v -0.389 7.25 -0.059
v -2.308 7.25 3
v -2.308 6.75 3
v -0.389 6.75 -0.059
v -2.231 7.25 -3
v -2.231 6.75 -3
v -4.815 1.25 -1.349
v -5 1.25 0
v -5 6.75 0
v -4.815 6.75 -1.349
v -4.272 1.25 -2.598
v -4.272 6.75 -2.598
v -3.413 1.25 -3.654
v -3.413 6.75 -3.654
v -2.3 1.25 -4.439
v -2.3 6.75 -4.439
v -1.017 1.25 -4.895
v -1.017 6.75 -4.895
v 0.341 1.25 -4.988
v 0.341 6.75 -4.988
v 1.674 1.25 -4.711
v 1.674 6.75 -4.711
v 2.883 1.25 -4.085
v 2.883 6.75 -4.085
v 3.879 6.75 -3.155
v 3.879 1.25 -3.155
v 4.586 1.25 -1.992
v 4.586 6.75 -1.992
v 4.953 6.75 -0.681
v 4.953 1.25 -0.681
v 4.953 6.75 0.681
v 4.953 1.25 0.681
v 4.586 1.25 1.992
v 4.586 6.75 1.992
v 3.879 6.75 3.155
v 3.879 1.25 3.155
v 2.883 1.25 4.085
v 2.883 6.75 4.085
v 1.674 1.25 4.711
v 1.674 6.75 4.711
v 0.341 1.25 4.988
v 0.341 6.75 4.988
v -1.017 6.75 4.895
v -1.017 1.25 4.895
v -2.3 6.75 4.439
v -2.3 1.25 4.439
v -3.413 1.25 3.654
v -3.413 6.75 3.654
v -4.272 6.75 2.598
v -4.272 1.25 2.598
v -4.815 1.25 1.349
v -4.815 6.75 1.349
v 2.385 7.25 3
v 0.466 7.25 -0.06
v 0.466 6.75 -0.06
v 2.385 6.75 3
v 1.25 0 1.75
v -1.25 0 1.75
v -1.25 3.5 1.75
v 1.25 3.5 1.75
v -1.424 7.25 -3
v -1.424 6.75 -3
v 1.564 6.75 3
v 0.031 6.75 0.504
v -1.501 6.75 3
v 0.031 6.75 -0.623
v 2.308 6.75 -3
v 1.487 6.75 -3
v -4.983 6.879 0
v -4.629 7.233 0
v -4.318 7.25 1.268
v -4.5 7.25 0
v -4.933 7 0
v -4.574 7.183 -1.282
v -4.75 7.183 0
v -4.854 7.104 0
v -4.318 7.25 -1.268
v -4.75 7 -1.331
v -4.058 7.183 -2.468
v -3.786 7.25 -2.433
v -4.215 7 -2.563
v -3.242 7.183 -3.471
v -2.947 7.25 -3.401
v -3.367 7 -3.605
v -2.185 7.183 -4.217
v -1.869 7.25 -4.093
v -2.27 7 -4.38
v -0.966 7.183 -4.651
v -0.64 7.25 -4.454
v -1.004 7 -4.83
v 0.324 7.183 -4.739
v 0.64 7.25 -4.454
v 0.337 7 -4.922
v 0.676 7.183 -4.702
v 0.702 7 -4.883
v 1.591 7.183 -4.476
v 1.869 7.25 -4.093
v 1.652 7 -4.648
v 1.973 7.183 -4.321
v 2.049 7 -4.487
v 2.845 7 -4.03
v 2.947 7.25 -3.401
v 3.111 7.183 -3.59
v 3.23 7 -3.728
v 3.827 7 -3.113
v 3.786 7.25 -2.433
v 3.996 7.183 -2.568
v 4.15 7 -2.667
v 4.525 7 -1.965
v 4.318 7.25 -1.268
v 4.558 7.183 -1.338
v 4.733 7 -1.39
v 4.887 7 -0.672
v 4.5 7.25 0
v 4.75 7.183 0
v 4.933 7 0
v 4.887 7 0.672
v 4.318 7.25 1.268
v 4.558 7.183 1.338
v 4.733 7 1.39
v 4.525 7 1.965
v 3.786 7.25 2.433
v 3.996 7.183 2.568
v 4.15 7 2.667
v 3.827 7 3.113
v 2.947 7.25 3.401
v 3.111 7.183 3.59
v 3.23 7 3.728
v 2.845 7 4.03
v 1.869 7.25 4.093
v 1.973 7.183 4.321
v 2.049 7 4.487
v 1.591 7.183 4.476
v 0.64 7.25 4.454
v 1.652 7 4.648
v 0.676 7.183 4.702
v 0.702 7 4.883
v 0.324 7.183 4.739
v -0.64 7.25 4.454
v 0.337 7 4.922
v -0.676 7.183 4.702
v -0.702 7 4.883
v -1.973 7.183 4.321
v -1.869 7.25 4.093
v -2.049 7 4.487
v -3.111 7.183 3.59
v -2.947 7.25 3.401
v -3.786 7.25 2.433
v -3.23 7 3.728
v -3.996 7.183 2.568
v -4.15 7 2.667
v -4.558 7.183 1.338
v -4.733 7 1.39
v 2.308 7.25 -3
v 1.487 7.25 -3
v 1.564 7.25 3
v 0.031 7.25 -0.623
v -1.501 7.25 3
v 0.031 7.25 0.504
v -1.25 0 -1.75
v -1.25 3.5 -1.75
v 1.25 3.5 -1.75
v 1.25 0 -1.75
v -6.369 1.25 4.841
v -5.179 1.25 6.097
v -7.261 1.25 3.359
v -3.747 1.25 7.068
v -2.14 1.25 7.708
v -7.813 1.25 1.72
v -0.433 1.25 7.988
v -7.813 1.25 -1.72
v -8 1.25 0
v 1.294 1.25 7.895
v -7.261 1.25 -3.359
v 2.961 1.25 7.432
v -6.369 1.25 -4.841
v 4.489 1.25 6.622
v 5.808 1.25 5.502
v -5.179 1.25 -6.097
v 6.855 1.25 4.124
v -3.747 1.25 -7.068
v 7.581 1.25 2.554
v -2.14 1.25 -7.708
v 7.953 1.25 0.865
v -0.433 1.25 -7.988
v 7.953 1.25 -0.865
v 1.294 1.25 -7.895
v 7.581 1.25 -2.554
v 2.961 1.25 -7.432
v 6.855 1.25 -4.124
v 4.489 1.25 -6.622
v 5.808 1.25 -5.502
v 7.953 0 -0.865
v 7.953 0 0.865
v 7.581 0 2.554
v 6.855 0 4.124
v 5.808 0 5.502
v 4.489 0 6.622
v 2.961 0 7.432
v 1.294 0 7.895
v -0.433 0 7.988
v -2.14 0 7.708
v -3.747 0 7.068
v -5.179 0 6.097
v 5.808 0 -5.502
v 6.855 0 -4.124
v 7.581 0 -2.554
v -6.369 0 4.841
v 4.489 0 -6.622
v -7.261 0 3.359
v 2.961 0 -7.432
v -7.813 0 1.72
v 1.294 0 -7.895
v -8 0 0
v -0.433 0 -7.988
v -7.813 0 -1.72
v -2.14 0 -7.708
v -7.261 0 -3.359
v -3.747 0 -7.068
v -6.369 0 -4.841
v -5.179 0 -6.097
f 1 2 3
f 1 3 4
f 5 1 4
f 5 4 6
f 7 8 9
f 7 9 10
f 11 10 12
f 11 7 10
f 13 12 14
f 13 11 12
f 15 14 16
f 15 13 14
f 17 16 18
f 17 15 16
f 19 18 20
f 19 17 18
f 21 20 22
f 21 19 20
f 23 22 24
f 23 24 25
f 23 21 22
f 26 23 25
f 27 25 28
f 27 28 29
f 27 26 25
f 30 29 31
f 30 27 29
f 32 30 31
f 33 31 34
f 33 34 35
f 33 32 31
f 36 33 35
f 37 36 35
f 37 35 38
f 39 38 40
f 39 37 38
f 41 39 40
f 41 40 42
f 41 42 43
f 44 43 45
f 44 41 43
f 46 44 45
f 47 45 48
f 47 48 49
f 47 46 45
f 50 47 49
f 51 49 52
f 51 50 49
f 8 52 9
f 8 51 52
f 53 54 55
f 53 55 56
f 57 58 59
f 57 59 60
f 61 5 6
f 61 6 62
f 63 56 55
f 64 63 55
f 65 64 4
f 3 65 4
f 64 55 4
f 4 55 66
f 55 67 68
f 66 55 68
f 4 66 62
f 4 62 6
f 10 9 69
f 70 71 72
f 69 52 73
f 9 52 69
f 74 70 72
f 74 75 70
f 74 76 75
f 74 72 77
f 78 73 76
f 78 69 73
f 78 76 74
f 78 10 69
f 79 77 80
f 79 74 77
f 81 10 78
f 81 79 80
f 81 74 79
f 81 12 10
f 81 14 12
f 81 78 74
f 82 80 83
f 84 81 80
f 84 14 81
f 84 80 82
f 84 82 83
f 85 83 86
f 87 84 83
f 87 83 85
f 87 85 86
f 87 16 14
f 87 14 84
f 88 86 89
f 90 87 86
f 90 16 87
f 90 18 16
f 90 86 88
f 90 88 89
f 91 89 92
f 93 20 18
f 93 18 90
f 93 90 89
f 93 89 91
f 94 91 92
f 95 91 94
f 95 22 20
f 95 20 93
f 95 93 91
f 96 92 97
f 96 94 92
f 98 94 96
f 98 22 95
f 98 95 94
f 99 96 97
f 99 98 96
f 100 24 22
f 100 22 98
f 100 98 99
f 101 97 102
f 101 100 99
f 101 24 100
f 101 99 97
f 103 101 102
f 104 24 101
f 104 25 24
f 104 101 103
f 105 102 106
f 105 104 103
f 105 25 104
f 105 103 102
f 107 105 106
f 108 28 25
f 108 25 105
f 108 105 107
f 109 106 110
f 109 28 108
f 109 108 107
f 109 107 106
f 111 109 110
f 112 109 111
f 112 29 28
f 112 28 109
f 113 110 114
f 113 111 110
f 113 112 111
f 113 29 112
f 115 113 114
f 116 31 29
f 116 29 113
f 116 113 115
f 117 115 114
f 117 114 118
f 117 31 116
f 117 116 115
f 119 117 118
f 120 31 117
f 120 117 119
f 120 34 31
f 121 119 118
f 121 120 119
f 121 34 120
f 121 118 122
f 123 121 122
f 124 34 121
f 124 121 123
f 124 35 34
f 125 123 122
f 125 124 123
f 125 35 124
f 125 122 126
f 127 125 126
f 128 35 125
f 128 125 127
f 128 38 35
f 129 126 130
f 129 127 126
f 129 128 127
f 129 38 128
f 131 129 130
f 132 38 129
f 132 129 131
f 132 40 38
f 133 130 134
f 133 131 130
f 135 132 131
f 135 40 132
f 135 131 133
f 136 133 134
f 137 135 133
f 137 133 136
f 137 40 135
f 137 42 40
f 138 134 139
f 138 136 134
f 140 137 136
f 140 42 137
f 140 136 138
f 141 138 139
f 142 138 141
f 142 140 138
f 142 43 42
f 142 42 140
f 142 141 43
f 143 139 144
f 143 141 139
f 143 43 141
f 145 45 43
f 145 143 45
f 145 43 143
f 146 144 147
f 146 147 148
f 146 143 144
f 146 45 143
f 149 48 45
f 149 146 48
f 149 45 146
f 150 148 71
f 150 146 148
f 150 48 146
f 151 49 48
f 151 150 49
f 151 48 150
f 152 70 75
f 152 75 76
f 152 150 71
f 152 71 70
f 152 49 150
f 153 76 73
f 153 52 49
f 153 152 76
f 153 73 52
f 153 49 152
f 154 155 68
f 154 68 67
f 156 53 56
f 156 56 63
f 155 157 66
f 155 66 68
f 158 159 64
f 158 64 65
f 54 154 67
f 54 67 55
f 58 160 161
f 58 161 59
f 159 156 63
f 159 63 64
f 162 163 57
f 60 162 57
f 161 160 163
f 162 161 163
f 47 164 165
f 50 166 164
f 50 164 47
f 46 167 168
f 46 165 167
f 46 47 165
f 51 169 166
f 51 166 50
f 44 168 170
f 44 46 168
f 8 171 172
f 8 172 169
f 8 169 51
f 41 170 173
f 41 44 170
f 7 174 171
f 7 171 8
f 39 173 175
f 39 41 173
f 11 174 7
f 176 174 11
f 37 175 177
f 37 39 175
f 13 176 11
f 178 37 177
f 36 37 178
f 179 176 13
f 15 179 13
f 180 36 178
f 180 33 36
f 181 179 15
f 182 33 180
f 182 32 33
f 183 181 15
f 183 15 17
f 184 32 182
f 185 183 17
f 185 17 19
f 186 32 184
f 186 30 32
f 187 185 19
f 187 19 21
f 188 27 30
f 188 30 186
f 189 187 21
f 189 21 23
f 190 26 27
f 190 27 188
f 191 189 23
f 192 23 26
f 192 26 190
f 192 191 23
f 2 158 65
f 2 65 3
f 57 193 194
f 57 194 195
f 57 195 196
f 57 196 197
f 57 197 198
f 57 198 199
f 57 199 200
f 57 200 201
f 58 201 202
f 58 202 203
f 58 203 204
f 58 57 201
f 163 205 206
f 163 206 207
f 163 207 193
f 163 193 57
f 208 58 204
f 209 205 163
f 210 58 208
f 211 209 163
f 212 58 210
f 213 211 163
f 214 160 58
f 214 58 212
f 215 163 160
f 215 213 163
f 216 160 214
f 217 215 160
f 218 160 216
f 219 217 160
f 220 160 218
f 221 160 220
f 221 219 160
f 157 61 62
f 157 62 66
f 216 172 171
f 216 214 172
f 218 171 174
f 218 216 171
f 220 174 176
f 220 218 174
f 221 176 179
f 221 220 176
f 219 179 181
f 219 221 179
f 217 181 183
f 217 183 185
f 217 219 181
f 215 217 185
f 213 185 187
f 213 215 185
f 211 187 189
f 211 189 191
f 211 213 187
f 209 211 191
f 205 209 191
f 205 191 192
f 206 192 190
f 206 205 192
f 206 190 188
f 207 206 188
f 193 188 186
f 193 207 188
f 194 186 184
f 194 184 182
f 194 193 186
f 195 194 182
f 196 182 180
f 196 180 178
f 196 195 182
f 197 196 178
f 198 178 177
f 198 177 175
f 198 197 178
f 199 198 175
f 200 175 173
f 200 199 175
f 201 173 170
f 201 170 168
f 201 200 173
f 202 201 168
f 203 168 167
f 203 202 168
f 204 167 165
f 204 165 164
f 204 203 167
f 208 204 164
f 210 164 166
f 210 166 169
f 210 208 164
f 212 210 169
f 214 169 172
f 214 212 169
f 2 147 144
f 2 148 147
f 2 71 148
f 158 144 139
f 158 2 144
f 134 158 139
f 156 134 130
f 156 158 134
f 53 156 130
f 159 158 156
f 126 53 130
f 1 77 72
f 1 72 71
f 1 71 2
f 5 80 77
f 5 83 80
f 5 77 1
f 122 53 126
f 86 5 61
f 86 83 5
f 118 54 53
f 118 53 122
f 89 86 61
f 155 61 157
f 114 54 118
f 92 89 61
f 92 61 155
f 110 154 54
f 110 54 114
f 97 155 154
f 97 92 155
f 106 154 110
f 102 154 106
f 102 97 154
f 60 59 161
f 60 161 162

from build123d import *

# Parameters (mm, degrees)
SKETCH2_W          = 2.5
SKETCH2_H          = 3.5
CUT_EXTRUDE1_DEPTH = 3.5
FILLET1_R          = 0.5
CUT_EXTRUDE2_DEPTH = 0.5


with BuildPart() as part:
    # Sketch1 → Revolve1 (revolve)
    with BuildSketch(Plane.XY, mode=Mode.PRIVATE) as revolve1_sk:
        Polygon((0, 7.25), (5, 7.25), (5, 1.25), (8, 1.25), (8, 0), (0, 0), align=None)
    revolve(revolve1_sk.sketch.rotate(Axis((0, 7.25, 0), (0, -1, 0)), 180), axis=Axis((0, 7.25, 0), (0, -1, 0)))

    # Sketch2 → Cut-Extrude1 (cut)
    with BuildSketch(Plane.XZ):
        Rectangle(SKETCH2_W, SKETCH2_H)
    extrude(amount=-CUT_EXTRUDE1_DEPTH, mode=Mode.SUBTRACT)

    # Fillet1
    fillet1_edges = [part.edges().sort_by_distance(p)[0] for p in [
        (5, 7.25, 0),
    ]]
    fillet(fillet1_edges, radius=FILLET1_R)

    # Sketch3 → Cut-Extrude2 (cut)
    with BuildSketch(Plane(origin=(0, 7.25, 0), x_dir=(1, 0, 0), z_dir=(0, 1, 0))):
        Polygon((-2.230769231, 3), (-1.424278846, 3), (0.03125, 0.622596154), (1.486778846, 3), (2.307692308, 3), (0.466346154, 0.060096154), (2.384615385, -3), (1.563701923, -3), (0.03125, -0.503605769), (-1.501201923, -3), (-2.307692308, -3), (-0.389423077, 0.058894231), align=None)
    extrude(amount=-CUT_EXTRUDE2_DEPTH, mode=Mode.SUBTRACT)


solid = part.part
